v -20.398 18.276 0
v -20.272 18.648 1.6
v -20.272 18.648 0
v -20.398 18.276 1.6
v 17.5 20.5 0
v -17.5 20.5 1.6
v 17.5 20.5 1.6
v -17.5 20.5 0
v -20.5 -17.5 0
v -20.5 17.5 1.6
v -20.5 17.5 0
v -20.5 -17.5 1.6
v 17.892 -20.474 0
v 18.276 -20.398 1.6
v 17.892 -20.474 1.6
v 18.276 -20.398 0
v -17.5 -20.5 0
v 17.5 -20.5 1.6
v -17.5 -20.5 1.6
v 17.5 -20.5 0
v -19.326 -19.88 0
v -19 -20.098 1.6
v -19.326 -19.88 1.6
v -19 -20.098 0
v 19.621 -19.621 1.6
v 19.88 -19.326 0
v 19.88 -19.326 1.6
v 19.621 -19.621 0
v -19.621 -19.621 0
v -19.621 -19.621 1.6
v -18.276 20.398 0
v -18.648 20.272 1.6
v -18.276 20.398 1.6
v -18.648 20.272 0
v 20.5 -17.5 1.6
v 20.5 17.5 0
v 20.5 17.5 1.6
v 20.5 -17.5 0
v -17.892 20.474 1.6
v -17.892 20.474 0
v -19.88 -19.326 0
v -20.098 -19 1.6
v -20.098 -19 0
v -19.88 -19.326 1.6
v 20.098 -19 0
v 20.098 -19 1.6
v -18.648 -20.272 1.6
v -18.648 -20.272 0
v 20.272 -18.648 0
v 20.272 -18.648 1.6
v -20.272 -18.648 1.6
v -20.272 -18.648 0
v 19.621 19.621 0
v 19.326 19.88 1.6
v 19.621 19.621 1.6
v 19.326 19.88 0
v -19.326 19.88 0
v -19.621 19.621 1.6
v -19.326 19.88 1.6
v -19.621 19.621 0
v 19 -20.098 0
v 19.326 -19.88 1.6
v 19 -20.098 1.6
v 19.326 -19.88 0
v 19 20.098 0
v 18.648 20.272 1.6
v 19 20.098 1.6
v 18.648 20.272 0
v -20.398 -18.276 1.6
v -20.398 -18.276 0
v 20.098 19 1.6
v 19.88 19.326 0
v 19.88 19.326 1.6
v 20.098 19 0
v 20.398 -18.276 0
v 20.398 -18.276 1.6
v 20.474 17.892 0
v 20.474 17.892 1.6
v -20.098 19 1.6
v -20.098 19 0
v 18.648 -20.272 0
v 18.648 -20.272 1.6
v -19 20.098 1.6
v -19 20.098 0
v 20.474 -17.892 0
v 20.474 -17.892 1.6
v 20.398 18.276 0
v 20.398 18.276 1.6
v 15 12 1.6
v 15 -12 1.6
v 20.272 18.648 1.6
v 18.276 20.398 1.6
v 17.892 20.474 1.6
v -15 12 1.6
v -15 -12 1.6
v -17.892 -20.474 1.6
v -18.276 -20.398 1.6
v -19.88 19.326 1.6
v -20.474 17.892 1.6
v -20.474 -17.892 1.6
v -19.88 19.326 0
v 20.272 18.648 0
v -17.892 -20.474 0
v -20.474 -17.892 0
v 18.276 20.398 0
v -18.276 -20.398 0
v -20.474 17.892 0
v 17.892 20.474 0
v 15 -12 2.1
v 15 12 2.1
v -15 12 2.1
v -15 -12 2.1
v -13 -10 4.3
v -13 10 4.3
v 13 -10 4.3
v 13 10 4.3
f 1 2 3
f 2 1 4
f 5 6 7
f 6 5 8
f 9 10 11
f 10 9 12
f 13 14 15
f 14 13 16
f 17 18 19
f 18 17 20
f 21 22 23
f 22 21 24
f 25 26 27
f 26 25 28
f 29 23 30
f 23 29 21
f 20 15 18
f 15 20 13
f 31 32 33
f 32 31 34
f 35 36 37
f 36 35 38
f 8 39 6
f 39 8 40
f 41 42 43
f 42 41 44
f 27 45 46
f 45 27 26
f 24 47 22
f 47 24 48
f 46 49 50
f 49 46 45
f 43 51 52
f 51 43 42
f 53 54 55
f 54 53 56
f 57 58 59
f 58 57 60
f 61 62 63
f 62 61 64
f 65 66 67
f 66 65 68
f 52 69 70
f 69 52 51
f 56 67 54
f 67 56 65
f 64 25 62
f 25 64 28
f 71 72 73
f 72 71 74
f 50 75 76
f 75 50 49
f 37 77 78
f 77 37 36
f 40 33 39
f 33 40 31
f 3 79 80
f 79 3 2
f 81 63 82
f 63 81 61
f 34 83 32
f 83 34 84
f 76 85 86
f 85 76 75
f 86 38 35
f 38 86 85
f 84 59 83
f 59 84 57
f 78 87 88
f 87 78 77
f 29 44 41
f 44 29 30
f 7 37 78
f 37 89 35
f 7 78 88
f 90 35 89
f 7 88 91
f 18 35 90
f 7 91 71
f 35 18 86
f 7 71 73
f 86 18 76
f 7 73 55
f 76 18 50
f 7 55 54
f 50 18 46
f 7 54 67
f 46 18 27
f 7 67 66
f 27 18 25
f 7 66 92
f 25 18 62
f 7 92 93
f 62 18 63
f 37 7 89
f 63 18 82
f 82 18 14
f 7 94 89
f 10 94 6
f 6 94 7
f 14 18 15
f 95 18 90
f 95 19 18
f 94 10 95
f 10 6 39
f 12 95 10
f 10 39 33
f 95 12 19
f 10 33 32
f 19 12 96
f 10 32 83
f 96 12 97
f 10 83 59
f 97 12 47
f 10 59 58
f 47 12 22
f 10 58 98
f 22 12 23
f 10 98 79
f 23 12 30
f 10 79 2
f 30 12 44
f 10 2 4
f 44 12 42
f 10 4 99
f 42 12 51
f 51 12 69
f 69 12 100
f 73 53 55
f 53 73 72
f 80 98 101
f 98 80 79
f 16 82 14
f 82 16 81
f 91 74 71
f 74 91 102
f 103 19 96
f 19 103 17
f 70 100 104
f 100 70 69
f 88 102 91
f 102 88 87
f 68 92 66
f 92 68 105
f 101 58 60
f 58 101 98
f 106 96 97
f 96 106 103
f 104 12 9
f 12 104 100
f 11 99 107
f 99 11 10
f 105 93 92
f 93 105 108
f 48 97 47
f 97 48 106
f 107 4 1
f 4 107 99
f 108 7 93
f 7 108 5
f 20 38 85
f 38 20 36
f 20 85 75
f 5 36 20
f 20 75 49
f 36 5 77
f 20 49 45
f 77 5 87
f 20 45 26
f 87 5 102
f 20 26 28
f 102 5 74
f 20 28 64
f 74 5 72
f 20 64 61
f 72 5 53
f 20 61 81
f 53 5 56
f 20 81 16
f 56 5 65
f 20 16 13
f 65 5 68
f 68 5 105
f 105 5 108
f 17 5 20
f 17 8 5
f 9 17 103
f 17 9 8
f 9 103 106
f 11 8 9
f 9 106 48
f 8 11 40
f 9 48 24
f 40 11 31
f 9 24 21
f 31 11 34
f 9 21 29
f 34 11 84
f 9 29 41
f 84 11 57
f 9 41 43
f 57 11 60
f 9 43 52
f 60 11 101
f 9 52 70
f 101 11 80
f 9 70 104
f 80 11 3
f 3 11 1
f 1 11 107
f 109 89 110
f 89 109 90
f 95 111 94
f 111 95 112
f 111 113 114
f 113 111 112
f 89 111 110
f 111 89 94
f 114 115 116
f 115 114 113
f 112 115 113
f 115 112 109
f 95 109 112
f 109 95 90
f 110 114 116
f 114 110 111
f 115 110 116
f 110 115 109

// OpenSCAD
$fa = 2;
$fs = 0.4;

module esc_stack() {
  color("#0b3d0b")
    union() {
      hull() {
        for (x = [-17.5, 17.5], y = [-17.5, 17.5])
          translate([x, y, 0])
            cylinder(h = 1.6, d = 6);
      }
      // The MOSFET block sits on the board (it floated 1.7 mm above it).
      color("#303038")
        translate([0, 0, 1.8])
          hull() {
            cube([30, 24, 0.6], center = true);
            translate([0, 0, 2.2])
              cube([26, 20, 0.6], center = true);
          }
    }
}

esc_stack();
